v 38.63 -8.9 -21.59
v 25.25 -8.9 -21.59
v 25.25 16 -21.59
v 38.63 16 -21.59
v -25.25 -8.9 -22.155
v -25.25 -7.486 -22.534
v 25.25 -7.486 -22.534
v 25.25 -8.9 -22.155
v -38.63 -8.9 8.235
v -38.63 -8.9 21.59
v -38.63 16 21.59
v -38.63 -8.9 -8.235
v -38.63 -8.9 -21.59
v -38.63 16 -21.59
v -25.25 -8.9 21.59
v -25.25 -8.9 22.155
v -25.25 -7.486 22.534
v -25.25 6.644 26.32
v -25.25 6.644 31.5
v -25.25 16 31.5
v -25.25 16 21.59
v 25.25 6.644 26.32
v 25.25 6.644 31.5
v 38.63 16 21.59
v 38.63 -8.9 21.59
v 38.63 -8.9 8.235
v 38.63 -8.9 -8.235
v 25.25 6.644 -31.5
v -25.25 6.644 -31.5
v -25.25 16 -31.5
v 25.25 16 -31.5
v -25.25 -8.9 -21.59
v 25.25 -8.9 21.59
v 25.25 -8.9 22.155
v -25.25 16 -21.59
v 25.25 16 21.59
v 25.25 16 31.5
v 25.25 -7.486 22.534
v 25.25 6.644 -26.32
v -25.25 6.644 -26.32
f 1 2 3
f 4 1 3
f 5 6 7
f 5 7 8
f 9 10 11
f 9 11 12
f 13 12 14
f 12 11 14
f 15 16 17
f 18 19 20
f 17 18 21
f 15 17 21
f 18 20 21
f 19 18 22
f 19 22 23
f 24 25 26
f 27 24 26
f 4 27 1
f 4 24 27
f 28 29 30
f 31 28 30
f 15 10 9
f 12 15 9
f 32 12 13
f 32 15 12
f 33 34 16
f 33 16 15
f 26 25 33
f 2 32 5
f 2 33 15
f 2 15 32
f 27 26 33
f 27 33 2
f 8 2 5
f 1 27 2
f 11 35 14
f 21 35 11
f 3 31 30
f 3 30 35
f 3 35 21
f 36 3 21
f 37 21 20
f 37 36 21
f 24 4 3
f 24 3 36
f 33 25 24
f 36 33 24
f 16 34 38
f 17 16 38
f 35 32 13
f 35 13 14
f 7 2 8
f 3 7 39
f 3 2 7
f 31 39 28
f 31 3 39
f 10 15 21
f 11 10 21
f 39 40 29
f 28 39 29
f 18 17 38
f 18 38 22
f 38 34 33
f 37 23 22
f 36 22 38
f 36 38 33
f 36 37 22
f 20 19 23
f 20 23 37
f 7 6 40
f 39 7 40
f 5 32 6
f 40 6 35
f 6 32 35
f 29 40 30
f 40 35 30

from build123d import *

# Parameters (mm, degrees)
BOSS_EXTRUDE1_DEPTH = 38.63
BOSS_EXTRUDE2_DEPTH = 25.25
SKETCH13_W          = 26.671300946
SKETCH13_H          = 17.817336211
BOSS_EXTRUDE3_DEPTH = 77.26
BOSS_EXTRUDE4_DEPTH = 50.5
SKETCH15_W          = 43.18
SKETCH15_H          = 24.9
BOSS_EXTRUDE5_DEPTH = 77.26


with BuildPart() as part:
    # Sketch2 → Boss-Extrude1 (new body)
    with BuildSketch(Plane(origin=(0, 0, 0), x_dir=(0, 0, -1), z_dir=(1, 0, 0))):
        with BuildLine():
            Line((-8.235, -8.9), (-20.12, -8.9))
            Line((-20.12, -8.9), (-21.59, -7.43))
            Line((-21.59, -7.43), (-21.59, 14.03))
            Line((-21.59, 14.03), (-20.12, 15.5))
            Line((-20.12, 15.5), (0, 15.5))
            Line((0, 15.5), (0, 3.015))
            Line((0, 3.015), (-7.65, 3.015))
            Line((-7.65, 3.015), (-8.003553391, 2.661446609))
            ThreePointArc((-8.003553391, 2.661446609), (-8.484745674, 1.499745674), (-9.646446609, 1.018553391))
            Line((-9.646446609, 1.018553391), (-10, 0.665))
            Line((-10, 0.665), (-10, -0.665))
            Line((-10, -0.665), (-9.646446609, -1.018553391))
            ThreePointArc((-9.646446609, -1.018553391), (-8.484745674, -1.499745674), (-8.003553391, -2.661446609))
            Line((-8.003553391, -2.661446609), (-6.5, -4.165))
            Line((-6.5, -4.165), (-6.5, -7.165))
            Line((-6.5, -7.165), (-8.235, -8.9))
        make_face()
    extrude(amount=BOSS_EXTRUDE1_DEPTH)

    # Sketch3 → Boss-Extrude2 (add)
    with BuildSketch(Plane(origin=(0, 0, 0), x_dir=(0, 0, -1), z_dir=(1, 0, 0))):
        Polygon((-20.12, -8.9), (-21.12, -8.9), (-22.534213562, -7.485786438), (-26.320335651, 6.644213562), (-31.5, 6.644213562), (-31.5, 16), (-20.855, 16), (-20.855, 15.6), (-5.355, 15.6), (-5.355, 16), (0, 16), (0, 15.5), (-20.12, 15.5), (-21.59, 14.03), (-21.59, -7.43), align=None)
    extrude(amount=BOSS_EXTRUDE2_DEPTH)

    # Mirror1: part across plane


with BuildPart() as part_1:
    add(part.part)
    add(part.part.mirror(Plane.XY))

    # Mirror2: part across plane


with BuildPart() as part_2:
    add(part_1.part)
    add(part_1.part.mirror(Plane(origin=(0, 0, 0), x_dir=(0, 0, 1), z_dir=(1, 0, 0))))

    # Sketch13 → Boss-Extrude3 (add)
    with BuildSketch(Plane(origin=(38.63, 0, 0), x_dir=(0, 0, -1), z_dir=(1, 0, 0))):
        with Locations((0.075172776, 0.008668105)):
            Rectangle(SKETCH13_W, SKETCH13_H)
    extrude(amount=-BOSS_EXTRUDE3_DEPTH)

    # Sketch14 → Boss-Extrude4 (add)
    with BuildSketch(Plane(origin=(25.25, 0, 0), x_dir=(0, 0, -1), z_dir=(1, 0, 0))):
        Polygon((-31.5, 16), (31.5, 16), (31.5, 6.644213562), (26.320335651, 6.644213562), (22.15527618, -8.9), (-22.15527618, -8.9), (-26.320335651, 6.644213562), (-31.5, 6.644213562), align=None)
    extrude(amount=-BOSS_EXTRUDE4_DEPTH)

    # Sketch15 → Boss-Extrude5 (add)
    with BuildSketch(Plane(origin=(38.63, 0, 0), x_dir=(0, 0, -1), z_dir=(1, 0, 0))):
        with Locations((0, 3.55)):
            Rectangle(SKETCH15_W, SKETCH15_H)
    extrude(amount=-BOSS_EXTRUDE5_DEPTH)


solid = part_2.part
